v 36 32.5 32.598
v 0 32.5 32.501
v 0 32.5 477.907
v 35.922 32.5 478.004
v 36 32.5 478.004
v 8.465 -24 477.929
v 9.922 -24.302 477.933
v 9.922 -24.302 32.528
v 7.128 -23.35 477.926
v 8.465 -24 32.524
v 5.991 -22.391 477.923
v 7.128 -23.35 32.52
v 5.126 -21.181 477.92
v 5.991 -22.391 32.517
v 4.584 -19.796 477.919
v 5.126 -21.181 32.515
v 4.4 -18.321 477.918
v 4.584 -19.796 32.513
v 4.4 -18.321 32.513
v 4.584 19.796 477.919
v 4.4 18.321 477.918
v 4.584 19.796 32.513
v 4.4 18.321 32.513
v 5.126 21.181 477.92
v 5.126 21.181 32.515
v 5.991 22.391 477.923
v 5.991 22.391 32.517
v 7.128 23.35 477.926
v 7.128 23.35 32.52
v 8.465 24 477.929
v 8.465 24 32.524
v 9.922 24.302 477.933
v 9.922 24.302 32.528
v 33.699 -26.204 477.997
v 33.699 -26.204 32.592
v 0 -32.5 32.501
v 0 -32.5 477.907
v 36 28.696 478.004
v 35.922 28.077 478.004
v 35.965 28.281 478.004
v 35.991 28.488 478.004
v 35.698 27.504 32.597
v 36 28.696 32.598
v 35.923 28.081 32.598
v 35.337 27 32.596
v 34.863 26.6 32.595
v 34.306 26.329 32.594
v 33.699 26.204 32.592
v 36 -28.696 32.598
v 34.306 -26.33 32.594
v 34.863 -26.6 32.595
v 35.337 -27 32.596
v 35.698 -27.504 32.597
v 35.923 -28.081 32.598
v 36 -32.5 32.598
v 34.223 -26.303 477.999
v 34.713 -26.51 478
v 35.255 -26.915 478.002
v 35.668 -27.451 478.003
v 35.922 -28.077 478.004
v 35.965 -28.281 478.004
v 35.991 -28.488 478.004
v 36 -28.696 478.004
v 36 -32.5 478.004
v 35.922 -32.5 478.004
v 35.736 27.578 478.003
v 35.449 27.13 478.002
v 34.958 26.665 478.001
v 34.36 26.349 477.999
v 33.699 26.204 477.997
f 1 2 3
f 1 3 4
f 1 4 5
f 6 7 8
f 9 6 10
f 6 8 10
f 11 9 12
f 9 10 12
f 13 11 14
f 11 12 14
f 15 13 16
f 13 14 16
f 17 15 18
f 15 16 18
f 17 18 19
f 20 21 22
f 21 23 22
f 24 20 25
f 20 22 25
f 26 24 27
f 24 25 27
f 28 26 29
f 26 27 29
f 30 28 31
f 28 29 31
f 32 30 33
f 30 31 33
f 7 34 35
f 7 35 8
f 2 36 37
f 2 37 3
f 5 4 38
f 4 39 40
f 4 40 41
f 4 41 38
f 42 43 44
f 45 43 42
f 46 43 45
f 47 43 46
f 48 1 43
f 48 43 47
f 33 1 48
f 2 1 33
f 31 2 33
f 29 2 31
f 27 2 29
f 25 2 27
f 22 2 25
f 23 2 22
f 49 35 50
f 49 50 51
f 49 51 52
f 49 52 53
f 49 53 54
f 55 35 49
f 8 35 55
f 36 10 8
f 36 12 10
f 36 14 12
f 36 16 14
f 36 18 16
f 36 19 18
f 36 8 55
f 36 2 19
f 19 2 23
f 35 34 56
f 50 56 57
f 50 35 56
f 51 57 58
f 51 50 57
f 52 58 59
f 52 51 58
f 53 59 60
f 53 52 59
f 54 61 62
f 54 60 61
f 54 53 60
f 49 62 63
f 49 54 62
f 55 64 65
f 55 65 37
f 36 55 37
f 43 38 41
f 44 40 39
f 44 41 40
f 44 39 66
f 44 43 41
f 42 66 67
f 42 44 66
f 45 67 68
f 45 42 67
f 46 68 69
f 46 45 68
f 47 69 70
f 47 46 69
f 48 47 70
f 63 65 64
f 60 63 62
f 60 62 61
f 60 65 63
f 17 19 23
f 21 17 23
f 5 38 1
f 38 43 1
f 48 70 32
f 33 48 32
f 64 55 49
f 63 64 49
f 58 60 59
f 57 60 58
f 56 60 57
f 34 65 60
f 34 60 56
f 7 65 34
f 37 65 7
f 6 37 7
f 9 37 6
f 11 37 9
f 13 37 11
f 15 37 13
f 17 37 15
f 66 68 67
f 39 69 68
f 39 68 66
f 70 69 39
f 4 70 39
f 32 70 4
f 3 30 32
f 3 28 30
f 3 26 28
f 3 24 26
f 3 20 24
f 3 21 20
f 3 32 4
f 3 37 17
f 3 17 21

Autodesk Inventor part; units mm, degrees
ref_plane "Начальная плоскость" through (0, 0, 32.5001) normal (0, 0, 1) x (1, 0, 0)
ref_plane "Конечная плоскость" through (0, 0, 478.0035) normal (0, 0, 1) x (1, 0, 0)
sketch "Эскиз" plane through (0, 0, 0) normal (0, 0, 1) x (1, 0, 0)
  line L0 (36, -32.5) -> (0, -32.5)
  line L1 (36, -32.5) -> (36, -28.696)
  line L2 (33.6994, -26.2039) -> (9.9215, -24.3017)
  line L3 (4.4, -18.3208) -> (4.4, 18.3208)
  line L4 (33.6994, 26.2039) -> (9.9215, 24.3017)
  line L5 (36, 28.696) -> (36, 32.5)
  line L6 (0, 32.5) -> (36, 32.5)
  line L7 (0, -32.5) -> (0, 32.5)
  arc A0 (4.4, -18.3208) -> (9.9215, -24.3017) centre (10.4, -18.3208) ccw
  arc A1 (9.9215, 24.3017) -> (4.4, 18.3208) centre (10.4, 18.3208) ccw
  arc A2 (36, -28.696) -> (33.6994, -26.2039) centre (33.5, -28.696) ccw
  arc A3 (33.6994, 26.2039) -> (36, 28.696) centre (33.5, 28.696) ccw
  line L8 (0, 45.5) -> (0, -45.5) construction
  line L9 (-7.2974, 0) -> (43.7847, 0) construction
  point P0 (36, -26.388)
  point P1 (4.4, -23.86)
  point P2 (4.4, 23.86)
  point P3 (36, 26.388)
  dimension "d3" = 36
  dimension "d5" = 4.4
  dimension "d7" = 65
  dimension "d9" = 8.64
  dimension "d11" = 8.64
  dimension "d13" = 6.112
  dimension "d15" = 6.112
  dimension "d22" = 6
  dimension "d23" = 2.5
  dimension "d24" = 32.5
  dimension "d25" = 0
extrude "Тело" add sketch "Эскиз" along normal up to surface (445.5034 mm away) from surface at 32.5001
sketch "Sketch3" plane through (0, 0, 0) normal (0, 0, 1) x (1, 0, 0)
  line L0 (0, 0) -> (10, 0)
ref_plane "Work Plane7" through (0, 0, 0) normal (0, -1, 0) x (1, 0, 0)
sketch "Sketch4" plane through (0, 0, 0) normal (0, -1, 0) x (1, 0, 0)
  line L0 (-2, 32.5001) -> (12, 32.5001)
  line L1 (-2, 478.0035) -> (12, 478.0035)
  dimension "d29" = 445.5034
ref_plane "РабПлоскость8" through (169.2997, 3.5, 32.958) normal (0.0027, 0, -1) x (-1, 0, -0.0027)
split "Разделение1" plane through (169.2997, 3.5, 32.958) removes the side toward (0.0027, 0, -1)
ref_plane "РабПлоскость9" through (164.2926, -32.5, 478.3501) normal (-0.0027, 0, 1) x (1, 0, 0.0027)
split "Разделение2" plane through (164.2926, -32.5, 478.3501) removes the side toward (-0.0027, 0, 1)
equation "\"d3\" = b"
equation "\"d5\" = t1"
equation "\"d7\" = ParH"
equation "\"d9\" = msp_x1 + t2"
equation "\"d11\" = msp_x1 + t2"
equation "\"d13\" = -msp_x2 + t2"
equation "\"d15\" = -msp_x2 + t2"
equation "\"d22\" = R"
equation "\"d23\" = R1"
equation "\"d24\" = 0.5 * d7"
equation "\"d16\" = G_L"
equation "\"R1\" = 2.5"
equation "\"R\" = 6"
equation "\"t1\" = 4.4"
equation "\"t2\" = 7.2"
equation "\"ParH\" = 65"
equation "\"b\" = 36"
equation "\"msp_x1\" = 0.04 * b"
equation "\"msp_x2\" = -0.08 * t1 + 0.04 * b"
equation "\"G_L\" = d29"
equation "\"ex\" = 0"
equation "\"G_OFFSET_START\" = -32.50012"
equation "\"G_OFFSET_END\" = -35.90288"
equation "\"d26\" = -G_OFFSET_START"
equation "\"d27\" = G_OFFSET_END + B_L"
equation "\"B_L\" = 513.90637"
properties part number "Швеллер 6.5U-445,5 ГОСТ 8240-97" material "Сталь, мягкая"
